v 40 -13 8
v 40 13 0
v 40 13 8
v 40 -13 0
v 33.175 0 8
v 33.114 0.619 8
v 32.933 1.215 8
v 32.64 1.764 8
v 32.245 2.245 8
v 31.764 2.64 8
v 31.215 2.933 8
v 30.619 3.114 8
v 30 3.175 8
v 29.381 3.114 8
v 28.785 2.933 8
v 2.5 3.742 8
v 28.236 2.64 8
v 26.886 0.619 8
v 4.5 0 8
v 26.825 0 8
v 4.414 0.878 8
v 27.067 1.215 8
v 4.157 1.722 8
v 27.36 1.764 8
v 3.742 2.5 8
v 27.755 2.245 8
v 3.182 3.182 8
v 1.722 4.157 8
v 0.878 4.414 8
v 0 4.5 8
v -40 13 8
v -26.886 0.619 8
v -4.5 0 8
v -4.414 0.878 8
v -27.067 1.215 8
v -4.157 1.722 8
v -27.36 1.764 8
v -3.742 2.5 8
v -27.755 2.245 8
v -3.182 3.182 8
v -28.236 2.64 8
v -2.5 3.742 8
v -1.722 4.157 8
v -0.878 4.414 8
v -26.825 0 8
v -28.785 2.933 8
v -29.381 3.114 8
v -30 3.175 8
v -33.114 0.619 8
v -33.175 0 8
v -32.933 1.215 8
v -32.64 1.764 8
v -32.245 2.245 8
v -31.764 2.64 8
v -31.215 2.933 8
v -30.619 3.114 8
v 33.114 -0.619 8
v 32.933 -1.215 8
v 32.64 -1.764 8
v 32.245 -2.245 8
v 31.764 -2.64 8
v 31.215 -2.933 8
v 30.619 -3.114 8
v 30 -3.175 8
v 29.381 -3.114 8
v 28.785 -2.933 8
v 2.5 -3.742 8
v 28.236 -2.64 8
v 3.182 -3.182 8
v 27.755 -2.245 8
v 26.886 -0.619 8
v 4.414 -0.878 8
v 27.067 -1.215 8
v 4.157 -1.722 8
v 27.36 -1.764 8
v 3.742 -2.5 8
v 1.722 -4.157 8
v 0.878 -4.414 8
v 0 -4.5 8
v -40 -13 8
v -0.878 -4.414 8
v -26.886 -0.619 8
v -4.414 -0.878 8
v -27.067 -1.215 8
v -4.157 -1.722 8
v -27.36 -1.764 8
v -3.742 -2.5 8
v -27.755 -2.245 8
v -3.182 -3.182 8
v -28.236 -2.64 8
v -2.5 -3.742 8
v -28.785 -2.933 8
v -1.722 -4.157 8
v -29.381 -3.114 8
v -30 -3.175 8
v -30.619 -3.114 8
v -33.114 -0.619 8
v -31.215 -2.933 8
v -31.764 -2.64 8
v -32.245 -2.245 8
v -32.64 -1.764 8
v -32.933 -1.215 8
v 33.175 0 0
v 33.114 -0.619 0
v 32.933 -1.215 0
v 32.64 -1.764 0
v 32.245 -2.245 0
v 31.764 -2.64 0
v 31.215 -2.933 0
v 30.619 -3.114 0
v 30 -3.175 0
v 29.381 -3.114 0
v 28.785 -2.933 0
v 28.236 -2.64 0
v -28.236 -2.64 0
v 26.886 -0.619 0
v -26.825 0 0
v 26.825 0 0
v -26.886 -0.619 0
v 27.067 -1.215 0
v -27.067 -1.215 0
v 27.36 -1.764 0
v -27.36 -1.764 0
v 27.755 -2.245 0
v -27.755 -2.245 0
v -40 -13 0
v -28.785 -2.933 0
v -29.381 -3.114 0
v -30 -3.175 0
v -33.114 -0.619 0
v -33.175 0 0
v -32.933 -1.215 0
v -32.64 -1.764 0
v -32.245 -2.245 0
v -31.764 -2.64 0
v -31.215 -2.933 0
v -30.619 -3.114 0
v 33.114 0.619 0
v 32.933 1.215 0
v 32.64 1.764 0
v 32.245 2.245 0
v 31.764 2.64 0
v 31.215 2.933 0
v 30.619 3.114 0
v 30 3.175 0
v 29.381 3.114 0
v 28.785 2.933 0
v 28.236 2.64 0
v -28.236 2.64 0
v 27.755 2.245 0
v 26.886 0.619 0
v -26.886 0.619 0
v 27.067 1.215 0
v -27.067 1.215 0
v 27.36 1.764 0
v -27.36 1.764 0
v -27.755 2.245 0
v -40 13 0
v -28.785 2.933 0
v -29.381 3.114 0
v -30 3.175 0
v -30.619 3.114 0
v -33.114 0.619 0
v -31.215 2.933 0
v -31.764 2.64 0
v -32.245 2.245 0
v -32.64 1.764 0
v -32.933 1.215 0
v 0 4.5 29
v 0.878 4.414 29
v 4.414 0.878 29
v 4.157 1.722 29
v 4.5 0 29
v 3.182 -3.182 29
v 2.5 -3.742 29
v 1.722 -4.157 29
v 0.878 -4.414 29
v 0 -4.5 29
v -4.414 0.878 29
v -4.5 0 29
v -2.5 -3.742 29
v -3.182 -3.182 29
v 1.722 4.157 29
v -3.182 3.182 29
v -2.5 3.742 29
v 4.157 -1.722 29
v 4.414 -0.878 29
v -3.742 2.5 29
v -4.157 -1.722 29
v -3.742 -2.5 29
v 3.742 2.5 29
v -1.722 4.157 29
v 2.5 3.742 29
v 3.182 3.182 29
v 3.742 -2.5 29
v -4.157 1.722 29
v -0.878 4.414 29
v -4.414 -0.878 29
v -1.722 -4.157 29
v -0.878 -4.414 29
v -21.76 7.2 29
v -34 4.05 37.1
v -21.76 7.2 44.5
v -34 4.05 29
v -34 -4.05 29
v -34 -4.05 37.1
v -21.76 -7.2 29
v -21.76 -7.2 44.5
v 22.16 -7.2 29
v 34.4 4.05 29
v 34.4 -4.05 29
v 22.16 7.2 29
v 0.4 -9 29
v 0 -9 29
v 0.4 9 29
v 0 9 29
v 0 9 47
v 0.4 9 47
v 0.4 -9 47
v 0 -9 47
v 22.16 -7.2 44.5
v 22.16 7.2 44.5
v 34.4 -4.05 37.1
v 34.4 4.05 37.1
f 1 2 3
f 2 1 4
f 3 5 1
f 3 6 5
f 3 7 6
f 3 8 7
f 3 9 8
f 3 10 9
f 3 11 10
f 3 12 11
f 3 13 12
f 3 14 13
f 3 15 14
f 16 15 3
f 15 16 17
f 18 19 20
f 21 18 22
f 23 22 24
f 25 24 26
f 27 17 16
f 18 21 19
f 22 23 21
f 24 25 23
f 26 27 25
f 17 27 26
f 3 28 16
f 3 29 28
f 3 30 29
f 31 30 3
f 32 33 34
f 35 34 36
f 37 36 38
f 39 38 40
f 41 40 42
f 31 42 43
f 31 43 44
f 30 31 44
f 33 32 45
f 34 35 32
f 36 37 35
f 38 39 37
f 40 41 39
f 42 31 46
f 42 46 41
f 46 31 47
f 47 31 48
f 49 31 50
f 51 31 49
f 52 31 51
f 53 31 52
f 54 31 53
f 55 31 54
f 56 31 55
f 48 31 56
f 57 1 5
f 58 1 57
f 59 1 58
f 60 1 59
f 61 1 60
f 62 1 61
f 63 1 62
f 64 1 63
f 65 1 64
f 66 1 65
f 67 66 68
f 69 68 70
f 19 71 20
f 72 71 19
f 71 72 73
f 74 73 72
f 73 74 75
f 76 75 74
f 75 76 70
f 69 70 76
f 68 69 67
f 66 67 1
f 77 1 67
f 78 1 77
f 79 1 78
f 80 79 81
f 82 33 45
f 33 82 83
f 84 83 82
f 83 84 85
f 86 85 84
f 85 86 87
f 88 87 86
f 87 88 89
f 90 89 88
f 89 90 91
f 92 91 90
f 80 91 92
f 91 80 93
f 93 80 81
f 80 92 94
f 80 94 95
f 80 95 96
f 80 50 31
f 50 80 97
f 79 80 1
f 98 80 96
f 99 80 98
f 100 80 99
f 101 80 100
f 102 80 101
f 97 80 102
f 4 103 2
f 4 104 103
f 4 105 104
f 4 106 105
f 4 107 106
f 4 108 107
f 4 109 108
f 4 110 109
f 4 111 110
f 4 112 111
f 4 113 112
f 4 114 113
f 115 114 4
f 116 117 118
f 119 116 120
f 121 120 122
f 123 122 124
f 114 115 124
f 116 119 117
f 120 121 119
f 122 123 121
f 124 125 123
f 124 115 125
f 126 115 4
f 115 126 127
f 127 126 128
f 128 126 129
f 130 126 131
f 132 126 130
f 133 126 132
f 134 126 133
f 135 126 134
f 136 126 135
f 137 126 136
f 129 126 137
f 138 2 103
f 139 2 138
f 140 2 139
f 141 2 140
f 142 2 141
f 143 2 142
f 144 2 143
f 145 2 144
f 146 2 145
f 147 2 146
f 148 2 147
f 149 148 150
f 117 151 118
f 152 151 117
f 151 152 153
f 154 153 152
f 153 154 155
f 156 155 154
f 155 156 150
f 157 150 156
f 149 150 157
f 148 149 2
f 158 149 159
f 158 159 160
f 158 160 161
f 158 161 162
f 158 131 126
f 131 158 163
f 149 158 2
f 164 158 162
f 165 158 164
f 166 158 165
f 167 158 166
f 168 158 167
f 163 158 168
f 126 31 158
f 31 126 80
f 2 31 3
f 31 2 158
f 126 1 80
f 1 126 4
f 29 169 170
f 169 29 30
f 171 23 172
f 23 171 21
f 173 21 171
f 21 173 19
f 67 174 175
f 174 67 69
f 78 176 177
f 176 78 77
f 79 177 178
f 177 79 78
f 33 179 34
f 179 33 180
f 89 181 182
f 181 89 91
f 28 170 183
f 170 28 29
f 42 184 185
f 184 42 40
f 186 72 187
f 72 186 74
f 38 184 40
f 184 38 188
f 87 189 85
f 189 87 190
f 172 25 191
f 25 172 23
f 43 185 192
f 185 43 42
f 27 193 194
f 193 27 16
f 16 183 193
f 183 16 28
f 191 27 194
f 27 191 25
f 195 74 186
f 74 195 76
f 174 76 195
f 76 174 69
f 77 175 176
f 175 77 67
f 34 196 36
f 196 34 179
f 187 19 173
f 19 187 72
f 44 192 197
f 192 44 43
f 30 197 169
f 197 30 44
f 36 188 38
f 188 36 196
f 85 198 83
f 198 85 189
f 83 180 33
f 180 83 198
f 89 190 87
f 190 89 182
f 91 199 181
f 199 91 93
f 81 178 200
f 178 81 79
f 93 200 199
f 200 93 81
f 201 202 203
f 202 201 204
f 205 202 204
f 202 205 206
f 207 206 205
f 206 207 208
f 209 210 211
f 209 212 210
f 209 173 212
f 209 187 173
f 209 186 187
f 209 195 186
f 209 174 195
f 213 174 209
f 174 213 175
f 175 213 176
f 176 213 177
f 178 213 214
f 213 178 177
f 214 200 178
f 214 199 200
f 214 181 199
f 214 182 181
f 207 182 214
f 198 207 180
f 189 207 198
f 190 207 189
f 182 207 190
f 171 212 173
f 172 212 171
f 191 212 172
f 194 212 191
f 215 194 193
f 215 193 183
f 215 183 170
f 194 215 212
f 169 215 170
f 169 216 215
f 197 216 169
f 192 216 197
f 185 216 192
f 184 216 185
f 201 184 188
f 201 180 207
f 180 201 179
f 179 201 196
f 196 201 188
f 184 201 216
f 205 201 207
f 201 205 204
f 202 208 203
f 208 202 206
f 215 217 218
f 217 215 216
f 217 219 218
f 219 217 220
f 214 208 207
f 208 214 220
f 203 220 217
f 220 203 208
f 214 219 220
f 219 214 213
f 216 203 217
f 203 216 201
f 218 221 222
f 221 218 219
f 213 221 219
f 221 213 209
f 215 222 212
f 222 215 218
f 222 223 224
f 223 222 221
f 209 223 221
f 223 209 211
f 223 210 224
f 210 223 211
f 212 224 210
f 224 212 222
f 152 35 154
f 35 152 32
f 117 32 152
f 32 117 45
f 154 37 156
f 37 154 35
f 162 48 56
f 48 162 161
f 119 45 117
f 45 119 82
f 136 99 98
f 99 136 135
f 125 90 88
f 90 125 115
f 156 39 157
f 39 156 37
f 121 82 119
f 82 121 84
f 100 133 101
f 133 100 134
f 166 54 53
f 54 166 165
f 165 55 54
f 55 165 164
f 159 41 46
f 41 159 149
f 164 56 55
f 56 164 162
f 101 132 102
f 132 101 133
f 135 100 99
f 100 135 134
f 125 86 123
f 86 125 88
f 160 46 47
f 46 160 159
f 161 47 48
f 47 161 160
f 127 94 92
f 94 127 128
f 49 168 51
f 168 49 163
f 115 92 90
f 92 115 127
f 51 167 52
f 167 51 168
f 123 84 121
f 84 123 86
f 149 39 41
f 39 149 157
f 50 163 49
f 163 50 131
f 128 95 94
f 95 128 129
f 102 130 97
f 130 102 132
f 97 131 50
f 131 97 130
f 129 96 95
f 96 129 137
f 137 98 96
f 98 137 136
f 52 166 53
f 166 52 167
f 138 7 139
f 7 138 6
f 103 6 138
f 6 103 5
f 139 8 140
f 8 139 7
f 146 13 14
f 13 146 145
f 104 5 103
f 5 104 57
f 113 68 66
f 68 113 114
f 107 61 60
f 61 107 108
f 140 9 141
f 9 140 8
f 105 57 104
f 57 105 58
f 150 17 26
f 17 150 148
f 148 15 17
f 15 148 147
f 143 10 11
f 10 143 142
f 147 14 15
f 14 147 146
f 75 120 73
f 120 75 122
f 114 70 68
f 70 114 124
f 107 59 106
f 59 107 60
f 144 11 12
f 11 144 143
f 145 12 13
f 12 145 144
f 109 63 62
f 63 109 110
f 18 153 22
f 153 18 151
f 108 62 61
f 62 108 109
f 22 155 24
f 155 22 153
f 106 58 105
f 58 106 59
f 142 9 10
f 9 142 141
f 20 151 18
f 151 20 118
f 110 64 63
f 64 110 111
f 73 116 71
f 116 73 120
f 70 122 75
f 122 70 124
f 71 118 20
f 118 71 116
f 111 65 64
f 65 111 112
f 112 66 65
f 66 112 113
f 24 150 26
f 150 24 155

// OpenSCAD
$fn = 32;

// ----------------------------------------------------------------------
// Boat cleat: 80 mm base, horn 38 mm up
// ----------------------------------------------------------------------

// --- parameters (mm) ---
base_l = 80;              // base length
base_w = 26;              // base width
base_t = 8;               // base thickness
horn_len = 68;            // horn length
horn_d = 18;              // horn diameter at the middle
horn_z = 38;              // horn axis height
end_drop = 10;            // how far the horn tips drop
post_d = 9;               // centre post diameter
holes_d = 6.35;           // fixing holes
hole_x = 30;              // fixing hole spacing

difference() {
  union() {
    translate([-40, -13, 0]) cube([base_l, base_w, base_t]);
    /* centre post, sunk 1 mm into the base */
    translate([0, 0, 7]) cylinder(h = 31, d = post_d);
    /* horn: a hull chain of boxes, full in the middle and lighter at the tips */
    hull() {
      translate([-34, -4.05, 29]) cube([0.4, 8.1, 8.1], center = false);
      translate([-21.76, -7.2, 29]) cube([0.4, 14.4, 15.5], center = false);
    }
    hull() {
      translate([-21.76, -7.2, 29]) cube([0.4, 14.4, 15.5], center = false);
      translate([0, -9, 29]) cube([0.4, 18, 18], center = false);
    }
    hull() {
      translate([0, -9, 29]) cube([0.4, 18, 18], center = false);
      translate([21.76, -7.2, 29]) cube([0.4, 14.4, 15.5], center = false);
    }
    hull() {
      translate([21.76, -7.2, 29]) cube([0.4, 14.4, 15.5], center = false);
      translate([34, -4.05, 29]) cube([0.4, 8.1, 8.1], center = false);
    }
  }
  translate([-30, 0, -2.5]) cylinder(h = base_t + 5, d = holes_d);
  translate([30, 0, -2.5]) cylinder(h = base_t + 5, d = holes_d);
}
